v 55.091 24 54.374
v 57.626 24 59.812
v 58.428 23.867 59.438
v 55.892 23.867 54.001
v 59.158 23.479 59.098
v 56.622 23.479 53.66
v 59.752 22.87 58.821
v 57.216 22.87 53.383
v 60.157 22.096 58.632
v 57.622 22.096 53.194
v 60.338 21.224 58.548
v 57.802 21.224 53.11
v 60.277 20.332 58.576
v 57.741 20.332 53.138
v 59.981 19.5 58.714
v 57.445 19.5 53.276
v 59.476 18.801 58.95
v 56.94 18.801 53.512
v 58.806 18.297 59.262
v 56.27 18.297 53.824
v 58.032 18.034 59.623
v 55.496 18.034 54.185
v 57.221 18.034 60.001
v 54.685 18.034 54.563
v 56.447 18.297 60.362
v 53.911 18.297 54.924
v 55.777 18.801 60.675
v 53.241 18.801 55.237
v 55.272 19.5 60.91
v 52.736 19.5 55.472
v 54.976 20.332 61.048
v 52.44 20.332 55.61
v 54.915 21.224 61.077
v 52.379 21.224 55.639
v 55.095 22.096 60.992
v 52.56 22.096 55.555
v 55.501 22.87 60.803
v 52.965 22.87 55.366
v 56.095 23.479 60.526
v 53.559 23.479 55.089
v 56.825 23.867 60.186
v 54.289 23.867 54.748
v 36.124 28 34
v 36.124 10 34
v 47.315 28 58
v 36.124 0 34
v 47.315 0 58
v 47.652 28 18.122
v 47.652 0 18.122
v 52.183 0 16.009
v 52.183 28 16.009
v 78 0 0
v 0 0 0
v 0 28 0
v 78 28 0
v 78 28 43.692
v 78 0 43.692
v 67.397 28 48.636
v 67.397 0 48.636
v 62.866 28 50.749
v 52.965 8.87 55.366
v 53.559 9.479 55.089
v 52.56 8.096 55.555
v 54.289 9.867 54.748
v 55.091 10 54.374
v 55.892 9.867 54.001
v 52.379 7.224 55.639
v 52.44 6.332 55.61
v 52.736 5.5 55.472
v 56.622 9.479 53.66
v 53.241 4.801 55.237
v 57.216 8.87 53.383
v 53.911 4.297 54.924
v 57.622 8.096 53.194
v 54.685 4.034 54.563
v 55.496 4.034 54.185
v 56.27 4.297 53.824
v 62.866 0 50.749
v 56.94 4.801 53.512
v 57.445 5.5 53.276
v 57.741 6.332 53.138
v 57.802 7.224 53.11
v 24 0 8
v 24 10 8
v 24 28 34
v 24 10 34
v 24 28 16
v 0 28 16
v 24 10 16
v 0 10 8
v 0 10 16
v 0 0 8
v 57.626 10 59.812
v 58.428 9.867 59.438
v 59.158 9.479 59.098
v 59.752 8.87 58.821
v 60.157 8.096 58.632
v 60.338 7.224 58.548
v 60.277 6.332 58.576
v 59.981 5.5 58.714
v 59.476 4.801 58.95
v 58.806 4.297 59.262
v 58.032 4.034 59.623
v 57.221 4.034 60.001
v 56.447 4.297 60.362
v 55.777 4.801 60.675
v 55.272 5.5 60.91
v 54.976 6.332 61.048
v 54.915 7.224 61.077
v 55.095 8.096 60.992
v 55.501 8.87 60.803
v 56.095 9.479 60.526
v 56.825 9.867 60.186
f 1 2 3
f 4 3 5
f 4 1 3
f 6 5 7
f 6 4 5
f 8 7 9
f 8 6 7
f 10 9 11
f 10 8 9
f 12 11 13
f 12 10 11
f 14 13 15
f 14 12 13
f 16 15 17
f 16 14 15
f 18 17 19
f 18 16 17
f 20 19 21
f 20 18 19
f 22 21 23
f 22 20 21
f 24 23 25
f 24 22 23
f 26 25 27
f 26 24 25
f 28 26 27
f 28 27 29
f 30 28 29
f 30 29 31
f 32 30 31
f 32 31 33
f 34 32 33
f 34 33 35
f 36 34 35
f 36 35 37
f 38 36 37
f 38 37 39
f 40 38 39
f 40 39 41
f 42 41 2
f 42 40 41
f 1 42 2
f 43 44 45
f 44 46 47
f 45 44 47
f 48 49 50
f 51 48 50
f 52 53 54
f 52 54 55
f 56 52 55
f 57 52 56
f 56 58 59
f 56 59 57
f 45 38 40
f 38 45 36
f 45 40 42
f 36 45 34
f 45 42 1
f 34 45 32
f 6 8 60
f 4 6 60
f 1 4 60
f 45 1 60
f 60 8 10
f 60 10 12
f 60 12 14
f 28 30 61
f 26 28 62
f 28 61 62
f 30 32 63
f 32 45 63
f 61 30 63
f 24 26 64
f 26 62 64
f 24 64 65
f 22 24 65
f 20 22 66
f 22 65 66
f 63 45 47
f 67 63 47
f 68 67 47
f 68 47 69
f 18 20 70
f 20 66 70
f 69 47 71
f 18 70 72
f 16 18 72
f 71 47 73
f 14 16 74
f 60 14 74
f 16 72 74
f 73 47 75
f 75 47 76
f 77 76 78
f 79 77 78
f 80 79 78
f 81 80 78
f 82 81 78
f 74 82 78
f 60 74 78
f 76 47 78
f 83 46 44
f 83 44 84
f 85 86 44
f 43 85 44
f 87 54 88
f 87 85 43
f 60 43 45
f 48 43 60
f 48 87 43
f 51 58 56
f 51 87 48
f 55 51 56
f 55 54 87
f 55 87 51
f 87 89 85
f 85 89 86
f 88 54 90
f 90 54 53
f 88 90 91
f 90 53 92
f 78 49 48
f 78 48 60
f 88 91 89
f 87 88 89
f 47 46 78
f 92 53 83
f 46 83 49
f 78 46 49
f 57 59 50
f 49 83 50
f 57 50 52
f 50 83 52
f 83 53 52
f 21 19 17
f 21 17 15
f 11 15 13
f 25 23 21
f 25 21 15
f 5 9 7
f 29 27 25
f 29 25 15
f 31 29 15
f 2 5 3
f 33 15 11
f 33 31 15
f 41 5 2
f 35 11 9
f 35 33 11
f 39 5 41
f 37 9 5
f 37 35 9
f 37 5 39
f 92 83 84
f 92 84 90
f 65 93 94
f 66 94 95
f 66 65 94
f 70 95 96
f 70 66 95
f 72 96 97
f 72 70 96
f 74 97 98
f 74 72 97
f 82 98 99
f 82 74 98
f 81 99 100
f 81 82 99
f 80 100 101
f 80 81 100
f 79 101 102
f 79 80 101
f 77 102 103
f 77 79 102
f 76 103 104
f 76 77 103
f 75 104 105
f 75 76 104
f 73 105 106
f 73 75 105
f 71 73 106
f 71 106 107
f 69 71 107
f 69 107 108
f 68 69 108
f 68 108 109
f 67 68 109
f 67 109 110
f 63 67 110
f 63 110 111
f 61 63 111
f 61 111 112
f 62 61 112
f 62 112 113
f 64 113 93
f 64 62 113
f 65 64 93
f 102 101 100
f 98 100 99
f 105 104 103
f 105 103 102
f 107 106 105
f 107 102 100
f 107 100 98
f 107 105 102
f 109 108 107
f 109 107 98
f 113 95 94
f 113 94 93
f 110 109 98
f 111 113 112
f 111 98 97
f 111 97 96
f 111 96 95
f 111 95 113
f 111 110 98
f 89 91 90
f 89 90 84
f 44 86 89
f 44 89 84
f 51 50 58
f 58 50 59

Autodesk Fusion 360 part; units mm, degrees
sketch "Sketch1" plane through (0, 0, 0) normal (0, 1, 0) x (1, 0, 0)
  line L0 (0, 0) -> (78, 0)
  line L1 (0, 0) -> (0, -8)
  line L2 (0, -8) -> (24, -8)
  line L3 (24, -8) -> (47.3154, -58)
  line L4 (47.3154, -58) -> (62.8659, -50.7487)
  line L5 (47.6516, -18.1216) -> (52.1832, -16.0085)
  line L6 (52.1832, -16.0085) -> (67.3974, -48.6356)
  line L7 (78, 0) -> (78, -43.6915)
  line L8 (67.3974, -48.6356) -> (78, -43.6915)
  line L9 (0, -8) -> (0, -16)
  line L10 (0, -16) -> (24, -16)
  line L11 (24, -16) -> (24, -34)
  line L12 (47.6516, -18.1216) -> (62.8659, -50.7487)
  line L13 (24, -34) -> (36.124, -34)
  dimension "d1" = 78
  dimension "d2" = 8
  dimension "d3" = 24
  dimension "d4" = 8
  dimension "d5" = 24
  dimension "d6" = 18
  dimension "d7" = 65
  dimension "d8" = 36
  dimension "d9" = 50
  dimension "d10" = 36
  dimension "d11" = 36
  dimension "d12" = 5
  dimension "d13" = 17.1581
extrude "Extrude1" add sketch "Sketch1" along normal blind 28
sketch "Sketch2" plane through (0, 0, 0) normal (0, -1, 0) x (1, 0, 0)
  line L0 (0, 16) -> (0, 0)
  line L1 (0, 0) -> (78, 0)
  line L2 (78, 0) -> (78, 43.6915)
  line L3 (78, 43.6915) -> (67.3974, 48.6356)
  line L4 (67.3974, 48.6356) -> (52.1832, 16.0085)
  line L5 (52.1832, 16.0085) -> (47.6516, 18.1216)
  line L6 (47.6516, 18.1216) -> (62.8659, 50.7487)
  line L7 (62.8659, 50.7487) -> (47.3154, 58)
  line L8 (47.3154, 58) -> (36.124, 34)
  line L9 (36.124, 34) -> (24, 34)
  line L10 (24, 34) -> (24, 16)
  line L11 (24, 16) -> (0, 16)
  line L12 (0, 0) -> (24, 0) construction
  line L13 (24, 0) -> (24, 8) construction
  line L14 (24, 16) -> (0, 16) construction
  line L15 (0, 16) -> (0, 0) construction
  line L16 (24, 0) -> (0, 0) construction
  line L17 (0, 0) -> (0, 8) construction
  line L18 (0, 8) -> (24, 8) construction
  line L19 (24, 8) -> (24, 0) construction
  line L20 (24, 16) -> (24, 34) construction
  line L21 (24, 34) -> (36.124, 34) construction
  line L22 (36.124, 34) -> (24, 8) construction
  line L23 (0, 8) -> (0, 16)
  line L24 (0, 16) -> (24, 16)
  line L25 (24, 16) -> (24, 34)
  line L26 (24, 34) -> (36.124, 34)
  line L27 (36.124, 34) -> (24, 8)
  line L28 (24, 8) -> (0, 8)
  dimension "d16" = 8
extrude "Extrude2" cut sketch "Sketch2" against normal blind 10 contours L0 L9 L10 L11 L23 L24 L25 L26 L27 L28
sketch "Sketch3" plane through (30.6661, 0, 65.7637) normal (0.4226, 0, 0.9063) x (0, 1, 0)
  line L0 (0, -18.3704) -> (0, -35.5285)
  line L1 (0, -35.5285) -> (28, -35.5285)
  line L2 (28, -35.5285) -> (28, -18.3704)
  line L3 (28, -18.3704) -> (0, -18.3704)
  line L4 (0, -18.3704) -> (28, -18.3704) construction
  line L5 (28, -18.3704) -> (28, -35.5285) construction
  line L6 (28, -35.5285) -> (0, -35.5285) construction
  line L7 (0, -35.5285) -> (0, -18.3704) construction
  line L8 (0, -35.5285) -> (28, -35.5285) construction
  line L9 (28, -35.5285) -> (28, -26.9495) construction
  line L10 (28, -26.9495) -> (0, -26.9495) construction
  line L11 (0, -26.9495) -> (0, -35.5285) construction
  line L12 (0, -26.9495) -> (28, -26.9495) construction
  line L13 (28, -26.9495) -> (28, -34.4495) construction
  line L14 (28, -34.4495) -> (0, -34.4495) construction
  line L15 (0, -34.4495) -> (0, -26.9495) construction
  line L16 (0, -26.9495) -> (28, -26.9495) construction
  line L17 (28, -26.9495) -> (28, -19.4495) construction
  line L18 (28, -19.4495) -> (0, -19.4495) construction
  line L19 (0, -19.4495) -> (0, -26.9495) construction
  line L20 (0, -35.5285) -> (7, -35.5285) construction
  line L21 (7, -35.5285) -> (7, -18.3704) construction
  line L22 (7, -18.3704) -> (0, -18.3704) construction
  line L23 (0, -18.3704) -> (0, -35.5285) construction
  line L24 (28, -35.5285) -> (21, -35.5285) construction
  line L25 (21, -35.5285) -> (21, -18.3704) construction
  line L26 (21, -18.3704) -> (28, -18.3704) construction
  line L27 (28, -18.3704) -> (28, -35.5285) construction
  circle A0 centre (7, -26.9495) radius 3
  circle A1 centre (21, -26.9495) radius 3
  dimension "d19" = 28
  dimension "d20" = 7.5
  dimension "d21" = 28
  dimension "d22" = 7.5
  dimension "d23" = 7
  dimension "d24" = 7
  dimension "d25" = 6
  dimension "d26" = 6
extrude "Extrude3" add sketch "Sketch3" along normal blind 6 contours A0 | A1
